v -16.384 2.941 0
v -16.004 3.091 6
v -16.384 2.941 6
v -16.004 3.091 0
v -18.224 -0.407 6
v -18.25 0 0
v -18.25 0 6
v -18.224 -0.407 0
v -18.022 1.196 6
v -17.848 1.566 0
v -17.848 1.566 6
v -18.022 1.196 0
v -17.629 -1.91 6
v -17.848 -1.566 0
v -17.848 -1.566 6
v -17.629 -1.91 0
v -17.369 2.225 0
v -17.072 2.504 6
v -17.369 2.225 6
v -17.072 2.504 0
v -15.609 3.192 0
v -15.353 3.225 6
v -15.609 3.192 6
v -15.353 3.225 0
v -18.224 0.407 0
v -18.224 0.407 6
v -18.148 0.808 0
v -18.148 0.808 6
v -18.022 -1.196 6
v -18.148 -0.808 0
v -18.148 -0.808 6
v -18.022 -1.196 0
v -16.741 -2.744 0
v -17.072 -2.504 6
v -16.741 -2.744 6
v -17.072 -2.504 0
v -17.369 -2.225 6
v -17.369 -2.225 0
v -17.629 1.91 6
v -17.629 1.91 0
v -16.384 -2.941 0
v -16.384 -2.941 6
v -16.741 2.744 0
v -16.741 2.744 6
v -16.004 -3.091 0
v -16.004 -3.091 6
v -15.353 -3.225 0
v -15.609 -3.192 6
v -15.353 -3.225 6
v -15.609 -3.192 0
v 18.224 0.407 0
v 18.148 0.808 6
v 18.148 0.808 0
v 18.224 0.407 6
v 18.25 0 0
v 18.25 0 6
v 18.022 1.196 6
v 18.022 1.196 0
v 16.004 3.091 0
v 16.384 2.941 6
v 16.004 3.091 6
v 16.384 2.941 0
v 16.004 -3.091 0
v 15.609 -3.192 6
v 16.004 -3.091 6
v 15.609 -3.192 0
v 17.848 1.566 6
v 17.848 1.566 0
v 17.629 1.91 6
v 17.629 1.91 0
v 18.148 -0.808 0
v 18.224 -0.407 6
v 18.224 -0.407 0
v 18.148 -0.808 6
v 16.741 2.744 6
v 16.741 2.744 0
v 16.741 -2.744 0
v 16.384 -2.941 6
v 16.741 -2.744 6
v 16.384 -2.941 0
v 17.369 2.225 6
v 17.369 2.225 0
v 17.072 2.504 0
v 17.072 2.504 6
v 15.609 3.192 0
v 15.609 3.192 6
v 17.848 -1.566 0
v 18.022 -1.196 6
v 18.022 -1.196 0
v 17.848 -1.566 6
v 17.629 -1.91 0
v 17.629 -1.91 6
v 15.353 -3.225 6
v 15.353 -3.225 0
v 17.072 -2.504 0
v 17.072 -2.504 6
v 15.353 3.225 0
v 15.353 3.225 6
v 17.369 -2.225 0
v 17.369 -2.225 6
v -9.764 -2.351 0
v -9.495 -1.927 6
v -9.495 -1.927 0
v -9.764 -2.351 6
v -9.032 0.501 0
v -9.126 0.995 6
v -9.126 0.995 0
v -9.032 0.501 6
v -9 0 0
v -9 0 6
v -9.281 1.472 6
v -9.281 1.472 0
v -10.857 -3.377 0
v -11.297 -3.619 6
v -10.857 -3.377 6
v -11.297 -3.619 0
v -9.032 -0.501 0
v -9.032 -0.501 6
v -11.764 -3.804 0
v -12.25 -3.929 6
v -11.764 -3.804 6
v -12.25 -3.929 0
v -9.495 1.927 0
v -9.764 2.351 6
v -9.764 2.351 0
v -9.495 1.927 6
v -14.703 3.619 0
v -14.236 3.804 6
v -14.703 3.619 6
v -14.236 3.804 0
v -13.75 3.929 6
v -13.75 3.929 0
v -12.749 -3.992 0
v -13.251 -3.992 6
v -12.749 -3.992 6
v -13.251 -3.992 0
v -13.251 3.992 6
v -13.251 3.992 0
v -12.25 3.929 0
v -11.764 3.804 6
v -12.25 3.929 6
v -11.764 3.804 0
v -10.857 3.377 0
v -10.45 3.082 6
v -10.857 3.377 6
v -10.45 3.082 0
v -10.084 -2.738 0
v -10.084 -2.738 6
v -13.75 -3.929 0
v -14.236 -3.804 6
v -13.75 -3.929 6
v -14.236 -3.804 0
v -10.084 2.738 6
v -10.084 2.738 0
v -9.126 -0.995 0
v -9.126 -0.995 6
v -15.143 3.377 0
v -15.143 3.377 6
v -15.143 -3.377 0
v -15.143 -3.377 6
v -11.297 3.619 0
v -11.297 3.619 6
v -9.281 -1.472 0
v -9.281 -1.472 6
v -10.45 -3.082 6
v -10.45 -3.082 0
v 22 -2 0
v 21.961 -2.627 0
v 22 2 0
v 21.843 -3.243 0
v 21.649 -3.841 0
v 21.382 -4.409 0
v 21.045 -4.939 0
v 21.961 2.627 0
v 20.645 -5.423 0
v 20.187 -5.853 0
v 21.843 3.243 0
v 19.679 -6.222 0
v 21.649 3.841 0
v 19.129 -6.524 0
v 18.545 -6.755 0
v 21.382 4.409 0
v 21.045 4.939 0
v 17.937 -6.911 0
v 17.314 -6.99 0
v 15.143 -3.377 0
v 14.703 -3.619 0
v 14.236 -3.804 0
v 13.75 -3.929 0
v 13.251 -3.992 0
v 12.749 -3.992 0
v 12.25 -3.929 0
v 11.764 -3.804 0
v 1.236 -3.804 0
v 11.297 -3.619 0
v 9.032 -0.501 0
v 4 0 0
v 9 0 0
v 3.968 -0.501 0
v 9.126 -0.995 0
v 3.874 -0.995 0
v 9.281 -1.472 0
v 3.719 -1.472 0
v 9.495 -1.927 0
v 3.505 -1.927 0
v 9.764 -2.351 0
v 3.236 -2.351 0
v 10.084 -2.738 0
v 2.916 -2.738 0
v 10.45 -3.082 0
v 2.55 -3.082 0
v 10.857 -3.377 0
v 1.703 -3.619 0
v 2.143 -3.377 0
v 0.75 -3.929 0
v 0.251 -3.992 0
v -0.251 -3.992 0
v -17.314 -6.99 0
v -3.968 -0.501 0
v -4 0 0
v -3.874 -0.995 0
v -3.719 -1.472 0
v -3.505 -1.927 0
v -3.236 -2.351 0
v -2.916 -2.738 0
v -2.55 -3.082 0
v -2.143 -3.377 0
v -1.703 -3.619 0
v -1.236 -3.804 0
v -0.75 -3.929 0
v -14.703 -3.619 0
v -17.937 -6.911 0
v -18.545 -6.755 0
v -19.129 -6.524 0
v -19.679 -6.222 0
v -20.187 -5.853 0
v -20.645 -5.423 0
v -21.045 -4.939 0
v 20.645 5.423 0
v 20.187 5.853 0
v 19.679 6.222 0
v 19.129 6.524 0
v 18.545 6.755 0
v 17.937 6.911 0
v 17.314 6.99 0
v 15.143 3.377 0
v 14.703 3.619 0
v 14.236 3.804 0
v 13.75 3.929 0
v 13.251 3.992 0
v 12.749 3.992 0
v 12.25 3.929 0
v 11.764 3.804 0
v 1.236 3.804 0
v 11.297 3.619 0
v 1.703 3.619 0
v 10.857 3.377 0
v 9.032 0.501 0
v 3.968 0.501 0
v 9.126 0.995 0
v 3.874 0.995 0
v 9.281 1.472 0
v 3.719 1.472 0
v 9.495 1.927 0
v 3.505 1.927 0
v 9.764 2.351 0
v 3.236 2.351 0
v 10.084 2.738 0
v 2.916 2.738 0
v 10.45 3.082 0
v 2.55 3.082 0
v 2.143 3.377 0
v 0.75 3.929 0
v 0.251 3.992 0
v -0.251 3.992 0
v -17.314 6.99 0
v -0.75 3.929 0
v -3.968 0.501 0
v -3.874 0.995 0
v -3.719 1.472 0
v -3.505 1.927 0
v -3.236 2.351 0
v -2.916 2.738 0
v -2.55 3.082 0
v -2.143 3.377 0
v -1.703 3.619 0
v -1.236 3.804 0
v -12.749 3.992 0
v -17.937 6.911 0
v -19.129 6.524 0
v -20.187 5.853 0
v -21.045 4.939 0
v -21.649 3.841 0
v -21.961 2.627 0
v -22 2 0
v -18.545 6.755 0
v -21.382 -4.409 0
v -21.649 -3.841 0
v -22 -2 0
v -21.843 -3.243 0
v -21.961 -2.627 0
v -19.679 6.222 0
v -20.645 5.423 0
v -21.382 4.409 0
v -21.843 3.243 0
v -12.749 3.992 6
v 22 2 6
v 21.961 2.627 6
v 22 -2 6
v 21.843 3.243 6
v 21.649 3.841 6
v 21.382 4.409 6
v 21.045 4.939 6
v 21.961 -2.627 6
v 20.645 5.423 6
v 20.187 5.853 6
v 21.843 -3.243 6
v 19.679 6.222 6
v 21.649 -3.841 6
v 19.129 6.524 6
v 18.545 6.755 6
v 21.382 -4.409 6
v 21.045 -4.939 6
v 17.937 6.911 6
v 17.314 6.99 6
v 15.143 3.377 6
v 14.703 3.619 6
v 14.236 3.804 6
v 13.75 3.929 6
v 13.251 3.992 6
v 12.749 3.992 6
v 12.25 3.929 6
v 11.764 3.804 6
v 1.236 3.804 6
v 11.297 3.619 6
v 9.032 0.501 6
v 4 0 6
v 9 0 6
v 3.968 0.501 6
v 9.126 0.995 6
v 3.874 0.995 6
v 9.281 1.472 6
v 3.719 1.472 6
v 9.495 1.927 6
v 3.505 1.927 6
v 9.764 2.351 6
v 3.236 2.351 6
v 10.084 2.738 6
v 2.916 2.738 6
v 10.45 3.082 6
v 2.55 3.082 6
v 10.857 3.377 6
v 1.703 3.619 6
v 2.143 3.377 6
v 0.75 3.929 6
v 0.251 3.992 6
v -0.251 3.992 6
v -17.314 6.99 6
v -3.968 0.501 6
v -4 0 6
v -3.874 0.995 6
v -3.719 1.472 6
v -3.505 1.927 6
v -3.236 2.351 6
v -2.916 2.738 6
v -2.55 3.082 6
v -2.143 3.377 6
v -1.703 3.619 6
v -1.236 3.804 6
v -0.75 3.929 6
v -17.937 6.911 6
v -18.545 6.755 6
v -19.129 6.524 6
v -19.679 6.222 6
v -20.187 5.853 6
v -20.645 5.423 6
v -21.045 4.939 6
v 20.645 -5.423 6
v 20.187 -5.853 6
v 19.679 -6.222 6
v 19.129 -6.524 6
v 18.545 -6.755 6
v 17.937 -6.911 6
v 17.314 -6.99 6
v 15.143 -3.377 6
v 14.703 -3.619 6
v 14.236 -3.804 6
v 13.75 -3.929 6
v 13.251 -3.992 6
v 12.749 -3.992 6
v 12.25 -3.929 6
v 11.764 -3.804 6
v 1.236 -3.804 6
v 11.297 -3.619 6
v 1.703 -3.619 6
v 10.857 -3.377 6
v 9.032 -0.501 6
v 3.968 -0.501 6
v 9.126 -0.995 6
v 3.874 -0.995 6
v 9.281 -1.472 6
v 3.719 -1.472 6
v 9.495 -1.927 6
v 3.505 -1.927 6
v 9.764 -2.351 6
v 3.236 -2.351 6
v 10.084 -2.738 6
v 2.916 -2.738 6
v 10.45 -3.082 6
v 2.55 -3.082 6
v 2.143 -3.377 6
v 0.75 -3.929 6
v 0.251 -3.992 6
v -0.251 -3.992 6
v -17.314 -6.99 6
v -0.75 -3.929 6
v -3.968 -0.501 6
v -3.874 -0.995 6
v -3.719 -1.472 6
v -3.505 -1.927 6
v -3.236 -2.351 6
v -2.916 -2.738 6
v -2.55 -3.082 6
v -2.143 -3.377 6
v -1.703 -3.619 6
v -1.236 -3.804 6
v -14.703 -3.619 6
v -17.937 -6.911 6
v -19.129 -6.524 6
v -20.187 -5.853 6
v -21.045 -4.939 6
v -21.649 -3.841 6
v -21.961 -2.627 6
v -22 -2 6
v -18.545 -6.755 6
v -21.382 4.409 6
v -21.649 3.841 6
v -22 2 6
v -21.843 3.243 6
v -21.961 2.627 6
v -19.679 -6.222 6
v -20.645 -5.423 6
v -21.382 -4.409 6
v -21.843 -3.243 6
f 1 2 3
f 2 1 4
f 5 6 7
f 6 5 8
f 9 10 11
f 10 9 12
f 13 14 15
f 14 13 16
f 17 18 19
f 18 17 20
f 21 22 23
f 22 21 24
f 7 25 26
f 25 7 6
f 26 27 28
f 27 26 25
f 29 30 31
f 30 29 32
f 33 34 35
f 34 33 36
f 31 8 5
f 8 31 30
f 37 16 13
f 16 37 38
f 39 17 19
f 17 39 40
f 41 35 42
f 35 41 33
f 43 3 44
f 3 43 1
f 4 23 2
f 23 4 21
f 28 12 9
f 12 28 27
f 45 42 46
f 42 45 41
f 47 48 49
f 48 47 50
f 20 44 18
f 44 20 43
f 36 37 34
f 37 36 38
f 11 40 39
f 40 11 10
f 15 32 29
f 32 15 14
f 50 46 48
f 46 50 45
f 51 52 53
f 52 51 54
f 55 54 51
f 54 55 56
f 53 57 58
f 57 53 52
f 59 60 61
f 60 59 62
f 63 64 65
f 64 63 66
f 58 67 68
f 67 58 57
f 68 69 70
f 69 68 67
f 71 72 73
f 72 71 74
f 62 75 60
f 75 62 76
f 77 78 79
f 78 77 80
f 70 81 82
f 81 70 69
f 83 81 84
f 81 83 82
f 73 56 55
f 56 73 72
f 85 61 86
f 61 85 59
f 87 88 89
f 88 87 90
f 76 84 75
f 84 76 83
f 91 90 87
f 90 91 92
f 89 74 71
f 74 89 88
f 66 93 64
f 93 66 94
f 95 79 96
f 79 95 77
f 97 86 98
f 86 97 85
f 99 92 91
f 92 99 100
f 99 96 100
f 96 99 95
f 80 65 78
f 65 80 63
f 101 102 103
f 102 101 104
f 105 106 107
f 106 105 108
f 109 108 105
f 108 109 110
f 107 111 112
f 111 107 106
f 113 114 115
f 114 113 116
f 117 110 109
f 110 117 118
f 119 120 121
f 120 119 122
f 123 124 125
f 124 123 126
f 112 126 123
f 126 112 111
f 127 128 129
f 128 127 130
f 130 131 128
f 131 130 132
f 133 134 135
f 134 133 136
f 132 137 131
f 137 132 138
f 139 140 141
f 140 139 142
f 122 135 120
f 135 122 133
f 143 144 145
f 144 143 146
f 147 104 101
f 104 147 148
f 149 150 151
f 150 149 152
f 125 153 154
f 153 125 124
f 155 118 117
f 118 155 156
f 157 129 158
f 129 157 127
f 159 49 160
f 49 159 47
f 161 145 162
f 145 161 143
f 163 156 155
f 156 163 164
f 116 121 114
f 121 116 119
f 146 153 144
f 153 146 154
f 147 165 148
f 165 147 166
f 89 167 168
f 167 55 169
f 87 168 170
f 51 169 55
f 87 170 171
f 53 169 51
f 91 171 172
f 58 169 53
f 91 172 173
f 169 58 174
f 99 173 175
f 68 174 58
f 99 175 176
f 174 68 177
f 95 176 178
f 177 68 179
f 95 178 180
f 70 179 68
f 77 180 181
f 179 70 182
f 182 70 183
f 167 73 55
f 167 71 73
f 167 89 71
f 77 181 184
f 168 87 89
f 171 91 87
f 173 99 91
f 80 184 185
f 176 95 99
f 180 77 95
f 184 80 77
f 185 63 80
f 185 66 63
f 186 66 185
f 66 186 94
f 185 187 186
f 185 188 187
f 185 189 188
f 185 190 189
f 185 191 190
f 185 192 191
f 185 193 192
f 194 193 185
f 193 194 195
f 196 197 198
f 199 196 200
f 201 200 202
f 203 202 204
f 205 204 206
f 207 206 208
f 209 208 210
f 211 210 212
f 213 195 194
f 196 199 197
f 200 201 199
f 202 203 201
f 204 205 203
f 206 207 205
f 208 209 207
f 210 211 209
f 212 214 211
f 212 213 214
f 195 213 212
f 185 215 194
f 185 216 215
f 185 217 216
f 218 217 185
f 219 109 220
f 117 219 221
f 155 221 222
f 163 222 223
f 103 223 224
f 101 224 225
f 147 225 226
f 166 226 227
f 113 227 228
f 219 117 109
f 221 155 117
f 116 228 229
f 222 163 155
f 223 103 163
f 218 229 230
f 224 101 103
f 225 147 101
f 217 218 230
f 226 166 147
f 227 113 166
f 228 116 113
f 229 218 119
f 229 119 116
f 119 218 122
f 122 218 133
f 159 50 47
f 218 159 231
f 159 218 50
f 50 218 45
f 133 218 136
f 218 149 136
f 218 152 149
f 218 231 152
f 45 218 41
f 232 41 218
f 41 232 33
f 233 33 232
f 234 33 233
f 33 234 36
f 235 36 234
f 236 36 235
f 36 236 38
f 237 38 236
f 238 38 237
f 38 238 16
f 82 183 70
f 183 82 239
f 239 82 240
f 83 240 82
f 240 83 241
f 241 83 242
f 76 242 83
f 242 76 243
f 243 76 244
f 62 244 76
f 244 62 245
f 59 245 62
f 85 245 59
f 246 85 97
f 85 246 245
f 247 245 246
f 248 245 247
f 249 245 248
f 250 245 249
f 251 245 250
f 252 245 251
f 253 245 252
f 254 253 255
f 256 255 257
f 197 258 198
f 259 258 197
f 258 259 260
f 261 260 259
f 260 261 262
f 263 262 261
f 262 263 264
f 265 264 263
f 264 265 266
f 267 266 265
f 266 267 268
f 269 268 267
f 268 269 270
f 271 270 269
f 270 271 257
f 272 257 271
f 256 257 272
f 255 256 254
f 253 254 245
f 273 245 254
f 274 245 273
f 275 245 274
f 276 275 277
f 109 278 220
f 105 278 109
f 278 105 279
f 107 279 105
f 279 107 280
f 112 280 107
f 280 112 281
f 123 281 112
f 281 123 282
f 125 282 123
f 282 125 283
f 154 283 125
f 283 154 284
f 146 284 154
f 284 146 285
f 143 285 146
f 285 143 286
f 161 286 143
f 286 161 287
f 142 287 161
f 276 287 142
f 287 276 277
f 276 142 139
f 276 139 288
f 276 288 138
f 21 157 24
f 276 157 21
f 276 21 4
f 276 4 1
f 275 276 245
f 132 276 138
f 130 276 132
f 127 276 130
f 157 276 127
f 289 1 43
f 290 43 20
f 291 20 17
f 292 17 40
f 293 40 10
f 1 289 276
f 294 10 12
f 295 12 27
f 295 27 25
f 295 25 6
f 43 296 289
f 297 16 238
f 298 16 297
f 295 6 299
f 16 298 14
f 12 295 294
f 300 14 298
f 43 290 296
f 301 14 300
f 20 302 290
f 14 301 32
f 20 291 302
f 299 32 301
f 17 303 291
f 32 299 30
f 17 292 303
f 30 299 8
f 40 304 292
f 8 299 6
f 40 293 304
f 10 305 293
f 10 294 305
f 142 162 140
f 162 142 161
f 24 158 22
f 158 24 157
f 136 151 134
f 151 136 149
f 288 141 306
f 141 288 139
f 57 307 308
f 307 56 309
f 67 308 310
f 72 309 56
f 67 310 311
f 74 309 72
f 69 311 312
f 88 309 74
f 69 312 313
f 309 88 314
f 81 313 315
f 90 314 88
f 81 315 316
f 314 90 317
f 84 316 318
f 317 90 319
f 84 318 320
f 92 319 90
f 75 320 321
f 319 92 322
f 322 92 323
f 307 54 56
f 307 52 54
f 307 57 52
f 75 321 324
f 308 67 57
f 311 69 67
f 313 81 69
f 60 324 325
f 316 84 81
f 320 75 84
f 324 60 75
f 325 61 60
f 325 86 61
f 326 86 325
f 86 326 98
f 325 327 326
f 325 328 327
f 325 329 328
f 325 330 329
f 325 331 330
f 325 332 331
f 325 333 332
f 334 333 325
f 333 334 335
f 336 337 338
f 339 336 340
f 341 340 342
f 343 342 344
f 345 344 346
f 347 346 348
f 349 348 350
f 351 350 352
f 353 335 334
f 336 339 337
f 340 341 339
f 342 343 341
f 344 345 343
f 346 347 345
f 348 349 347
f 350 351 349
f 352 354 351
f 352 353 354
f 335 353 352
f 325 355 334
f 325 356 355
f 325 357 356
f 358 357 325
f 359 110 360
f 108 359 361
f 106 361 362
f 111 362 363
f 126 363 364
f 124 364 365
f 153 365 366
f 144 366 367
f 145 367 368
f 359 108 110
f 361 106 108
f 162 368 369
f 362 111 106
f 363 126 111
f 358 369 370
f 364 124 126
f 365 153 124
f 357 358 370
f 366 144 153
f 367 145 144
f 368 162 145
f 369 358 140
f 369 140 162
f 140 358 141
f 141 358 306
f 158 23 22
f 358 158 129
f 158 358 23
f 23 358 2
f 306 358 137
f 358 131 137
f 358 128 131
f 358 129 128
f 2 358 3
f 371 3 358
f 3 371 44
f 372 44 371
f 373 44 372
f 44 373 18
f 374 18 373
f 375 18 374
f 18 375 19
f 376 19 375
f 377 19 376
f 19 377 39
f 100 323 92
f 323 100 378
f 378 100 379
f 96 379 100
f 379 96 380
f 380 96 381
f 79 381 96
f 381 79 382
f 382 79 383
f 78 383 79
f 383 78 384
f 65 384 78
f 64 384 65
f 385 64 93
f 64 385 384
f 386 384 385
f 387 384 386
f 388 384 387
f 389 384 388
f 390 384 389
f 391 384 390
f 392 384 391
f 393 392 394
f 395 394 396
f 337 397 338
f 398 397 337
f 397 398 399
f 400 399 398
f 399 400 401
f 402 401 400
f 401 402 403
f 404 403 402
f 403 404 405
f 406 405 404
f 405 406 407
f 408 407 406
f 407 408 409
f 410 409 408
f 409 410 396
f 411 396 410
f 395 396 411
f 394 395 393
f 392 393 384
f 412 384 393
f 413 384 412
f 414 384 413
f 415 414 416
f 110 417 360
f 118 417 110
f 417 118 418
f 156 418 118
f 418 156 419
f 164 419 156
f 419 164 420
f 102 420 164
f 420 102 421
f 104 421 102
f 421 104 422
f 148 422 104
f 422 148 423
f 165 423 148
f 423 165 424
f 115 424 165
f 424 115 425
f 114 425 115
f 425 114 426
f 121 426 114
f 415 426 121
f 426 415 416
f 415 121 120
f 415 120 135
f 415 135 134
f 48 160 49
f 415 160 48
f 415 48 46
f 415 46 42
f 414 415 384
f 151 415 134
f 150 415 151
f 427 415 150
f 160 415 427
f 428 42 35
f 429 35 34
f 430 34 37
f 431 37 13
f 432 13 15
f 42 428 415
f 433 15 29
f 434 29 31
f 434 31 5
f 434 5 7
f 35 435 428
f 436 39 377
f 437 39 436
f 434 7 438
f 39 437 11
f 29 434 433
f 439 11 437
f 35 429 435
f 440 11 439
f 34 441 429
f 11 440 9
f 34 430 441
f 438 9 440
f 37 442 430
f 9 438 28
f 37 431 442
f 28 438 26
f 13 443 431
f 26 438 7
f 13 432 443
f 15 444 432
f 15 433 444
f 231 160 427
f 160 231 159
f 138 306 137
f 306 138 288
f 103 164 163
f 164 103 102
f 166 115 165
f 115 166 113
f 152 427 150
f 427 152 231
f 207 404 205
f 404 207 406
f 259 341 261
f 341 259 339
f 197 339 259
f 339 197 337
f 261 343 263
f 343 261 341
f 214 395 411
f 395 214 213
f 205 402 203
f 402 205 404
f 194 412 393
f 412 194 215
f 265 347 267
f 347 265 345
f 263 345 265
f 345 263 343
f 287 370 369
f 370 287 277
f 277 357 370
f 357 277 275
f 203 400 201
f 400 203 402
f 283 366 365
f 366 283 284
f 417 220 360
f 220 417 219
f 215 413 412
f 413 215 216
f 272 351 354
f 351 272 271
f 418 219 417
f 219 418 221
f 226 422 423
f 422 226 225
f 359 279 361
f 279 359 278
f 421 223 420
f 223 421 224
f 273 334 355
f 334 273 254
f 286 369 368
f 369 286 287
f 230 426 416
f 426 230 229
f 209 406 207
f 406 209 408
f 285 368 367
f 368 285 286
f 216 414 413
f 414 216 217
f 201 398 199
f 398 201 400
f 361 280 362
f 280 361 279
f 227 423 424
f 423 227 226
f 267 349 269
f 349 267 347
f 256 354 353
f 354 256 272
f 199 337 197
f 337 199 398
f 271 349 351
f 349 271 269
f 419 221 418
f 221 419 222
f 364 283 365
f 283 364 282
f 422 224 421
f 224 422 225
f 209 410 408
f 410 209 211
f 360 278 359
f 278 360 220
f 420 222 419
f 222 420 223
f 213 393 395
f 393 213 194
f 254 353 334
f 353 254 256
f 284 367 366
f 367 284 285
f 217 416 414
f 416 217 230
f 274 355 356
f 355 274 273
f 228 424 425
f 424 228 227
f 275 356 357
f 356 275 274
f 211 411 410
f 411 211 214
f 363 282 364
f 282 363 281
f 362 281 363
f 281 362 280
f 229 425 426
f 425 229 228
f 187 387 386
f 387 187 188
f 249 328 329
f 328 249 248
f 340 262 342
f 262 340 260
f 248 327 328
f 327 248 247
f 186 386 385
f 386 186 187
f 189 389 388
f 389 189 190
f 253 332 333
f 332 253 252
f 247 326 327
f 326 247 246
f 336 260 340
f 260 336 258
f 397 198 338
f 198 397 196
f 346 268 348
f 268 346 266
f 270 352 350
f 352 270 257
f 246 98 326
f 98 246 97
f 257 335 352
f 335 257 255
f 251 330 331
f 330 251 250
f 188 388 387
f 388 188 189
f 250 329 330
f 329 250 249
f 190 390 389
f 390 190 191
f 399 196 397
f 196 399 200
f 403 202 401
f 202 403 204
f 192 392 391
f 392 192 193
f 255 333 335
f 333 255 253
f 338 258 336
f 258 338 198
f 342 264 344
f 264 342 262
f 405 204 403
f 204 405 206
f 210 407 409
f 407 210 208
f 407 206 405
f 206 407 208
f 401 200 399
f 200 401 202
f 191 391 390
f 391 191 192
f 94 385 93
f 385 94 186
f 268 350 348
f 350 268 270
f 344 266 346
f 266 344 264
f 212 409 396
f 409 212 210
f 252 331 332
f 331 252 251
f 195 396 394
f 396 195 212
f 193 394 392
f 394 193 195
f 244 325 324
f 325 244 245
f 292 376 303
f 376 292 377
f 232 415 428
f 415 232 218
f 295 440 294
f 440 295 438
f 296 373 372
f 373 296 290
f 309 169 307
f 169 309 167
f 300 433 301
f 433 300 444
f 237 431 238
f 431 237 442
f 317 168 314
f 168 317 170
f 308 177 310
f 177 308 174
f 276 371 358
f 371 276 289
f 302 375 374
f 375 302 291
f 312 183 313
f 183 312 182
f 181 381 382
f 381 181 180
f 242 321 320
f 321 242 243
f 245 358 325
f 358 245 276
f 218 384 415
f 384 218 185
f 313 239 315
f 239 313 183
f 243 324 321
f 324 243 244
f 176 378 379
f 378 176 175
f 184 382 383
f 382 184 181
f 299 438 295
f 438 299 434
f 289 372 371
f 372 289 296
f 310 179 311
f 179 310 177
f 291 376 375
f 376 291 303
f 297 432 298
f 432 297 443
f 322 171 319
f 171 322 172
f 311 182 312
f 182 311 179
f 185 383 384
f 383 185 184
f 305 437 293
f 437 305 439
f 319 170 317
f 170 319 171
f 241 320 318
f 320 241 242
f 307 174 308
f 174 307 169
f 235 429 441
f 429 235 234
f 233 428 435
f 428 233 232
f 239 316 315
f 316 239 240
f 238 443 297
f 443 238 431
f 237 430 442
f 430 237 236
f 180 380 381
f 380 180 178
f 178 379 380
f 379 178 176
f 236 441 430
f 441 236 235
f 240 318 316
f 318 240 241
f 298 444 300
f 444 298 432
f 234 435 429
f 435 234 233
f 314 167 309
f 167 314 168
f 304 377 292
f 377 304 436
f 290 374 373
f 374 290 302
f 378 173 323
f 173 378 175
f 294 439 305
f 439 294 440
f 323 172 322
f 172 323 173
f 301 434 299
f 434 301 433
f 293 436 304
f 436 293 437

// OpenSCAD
$fn = 50;


difference() {
	union() {
		hull() {
			translate(v = [-17.0000000000, 2.0000000000, 0]) {
				cylinder(h = 6, r = 5);
			}
			translate(v = [17.0000000000, 2.0000000000, 0]) {
				cylinder(h = 6, r = 5);
			}
			translate(v = [-17.0000000000, -2.0000000000, 0]) {
				cylinder(h = 6, r = 5);
			}
			translate(v = [17.0000000000, -2.0000000000, 0]) {
				cylinder(h = 6, r = 5);
			}
		}
	}
	union() {
		#translate(v = [-15.0000000000, 0.0000000000, -100.0000000000]) {
			cylinder(h = 200, r = 3.2500000000);
		}
		#translate(v = [-15.0000000000, 0.0000000000, -100.0000000000]) {
			cylinder(h = 200, r = 3.2500000000);
		}
		#translate(v = [15.0000000000, 0.0000000000, -100.0000000000]) {
			cylinder(h = 200, r = 3.2500000000);
		}
		#translate(v = [15.0000000000, 0.0000000000, -100.0000000000]) {
			cylinder(h = 200, r = 3.2500000000);
		}
		#translate(v = [-13.0000000000, 0, 0]) {
			cylinder(h = 6, r = 4.0000000000);
		}
		#cylinder(h = 6, r = 4.0000000000);
		#translate(v = [13.0000000000, 0, 0]) {
			cylinder(h = 6, r = 4.0000000000);
		}
	}
}
